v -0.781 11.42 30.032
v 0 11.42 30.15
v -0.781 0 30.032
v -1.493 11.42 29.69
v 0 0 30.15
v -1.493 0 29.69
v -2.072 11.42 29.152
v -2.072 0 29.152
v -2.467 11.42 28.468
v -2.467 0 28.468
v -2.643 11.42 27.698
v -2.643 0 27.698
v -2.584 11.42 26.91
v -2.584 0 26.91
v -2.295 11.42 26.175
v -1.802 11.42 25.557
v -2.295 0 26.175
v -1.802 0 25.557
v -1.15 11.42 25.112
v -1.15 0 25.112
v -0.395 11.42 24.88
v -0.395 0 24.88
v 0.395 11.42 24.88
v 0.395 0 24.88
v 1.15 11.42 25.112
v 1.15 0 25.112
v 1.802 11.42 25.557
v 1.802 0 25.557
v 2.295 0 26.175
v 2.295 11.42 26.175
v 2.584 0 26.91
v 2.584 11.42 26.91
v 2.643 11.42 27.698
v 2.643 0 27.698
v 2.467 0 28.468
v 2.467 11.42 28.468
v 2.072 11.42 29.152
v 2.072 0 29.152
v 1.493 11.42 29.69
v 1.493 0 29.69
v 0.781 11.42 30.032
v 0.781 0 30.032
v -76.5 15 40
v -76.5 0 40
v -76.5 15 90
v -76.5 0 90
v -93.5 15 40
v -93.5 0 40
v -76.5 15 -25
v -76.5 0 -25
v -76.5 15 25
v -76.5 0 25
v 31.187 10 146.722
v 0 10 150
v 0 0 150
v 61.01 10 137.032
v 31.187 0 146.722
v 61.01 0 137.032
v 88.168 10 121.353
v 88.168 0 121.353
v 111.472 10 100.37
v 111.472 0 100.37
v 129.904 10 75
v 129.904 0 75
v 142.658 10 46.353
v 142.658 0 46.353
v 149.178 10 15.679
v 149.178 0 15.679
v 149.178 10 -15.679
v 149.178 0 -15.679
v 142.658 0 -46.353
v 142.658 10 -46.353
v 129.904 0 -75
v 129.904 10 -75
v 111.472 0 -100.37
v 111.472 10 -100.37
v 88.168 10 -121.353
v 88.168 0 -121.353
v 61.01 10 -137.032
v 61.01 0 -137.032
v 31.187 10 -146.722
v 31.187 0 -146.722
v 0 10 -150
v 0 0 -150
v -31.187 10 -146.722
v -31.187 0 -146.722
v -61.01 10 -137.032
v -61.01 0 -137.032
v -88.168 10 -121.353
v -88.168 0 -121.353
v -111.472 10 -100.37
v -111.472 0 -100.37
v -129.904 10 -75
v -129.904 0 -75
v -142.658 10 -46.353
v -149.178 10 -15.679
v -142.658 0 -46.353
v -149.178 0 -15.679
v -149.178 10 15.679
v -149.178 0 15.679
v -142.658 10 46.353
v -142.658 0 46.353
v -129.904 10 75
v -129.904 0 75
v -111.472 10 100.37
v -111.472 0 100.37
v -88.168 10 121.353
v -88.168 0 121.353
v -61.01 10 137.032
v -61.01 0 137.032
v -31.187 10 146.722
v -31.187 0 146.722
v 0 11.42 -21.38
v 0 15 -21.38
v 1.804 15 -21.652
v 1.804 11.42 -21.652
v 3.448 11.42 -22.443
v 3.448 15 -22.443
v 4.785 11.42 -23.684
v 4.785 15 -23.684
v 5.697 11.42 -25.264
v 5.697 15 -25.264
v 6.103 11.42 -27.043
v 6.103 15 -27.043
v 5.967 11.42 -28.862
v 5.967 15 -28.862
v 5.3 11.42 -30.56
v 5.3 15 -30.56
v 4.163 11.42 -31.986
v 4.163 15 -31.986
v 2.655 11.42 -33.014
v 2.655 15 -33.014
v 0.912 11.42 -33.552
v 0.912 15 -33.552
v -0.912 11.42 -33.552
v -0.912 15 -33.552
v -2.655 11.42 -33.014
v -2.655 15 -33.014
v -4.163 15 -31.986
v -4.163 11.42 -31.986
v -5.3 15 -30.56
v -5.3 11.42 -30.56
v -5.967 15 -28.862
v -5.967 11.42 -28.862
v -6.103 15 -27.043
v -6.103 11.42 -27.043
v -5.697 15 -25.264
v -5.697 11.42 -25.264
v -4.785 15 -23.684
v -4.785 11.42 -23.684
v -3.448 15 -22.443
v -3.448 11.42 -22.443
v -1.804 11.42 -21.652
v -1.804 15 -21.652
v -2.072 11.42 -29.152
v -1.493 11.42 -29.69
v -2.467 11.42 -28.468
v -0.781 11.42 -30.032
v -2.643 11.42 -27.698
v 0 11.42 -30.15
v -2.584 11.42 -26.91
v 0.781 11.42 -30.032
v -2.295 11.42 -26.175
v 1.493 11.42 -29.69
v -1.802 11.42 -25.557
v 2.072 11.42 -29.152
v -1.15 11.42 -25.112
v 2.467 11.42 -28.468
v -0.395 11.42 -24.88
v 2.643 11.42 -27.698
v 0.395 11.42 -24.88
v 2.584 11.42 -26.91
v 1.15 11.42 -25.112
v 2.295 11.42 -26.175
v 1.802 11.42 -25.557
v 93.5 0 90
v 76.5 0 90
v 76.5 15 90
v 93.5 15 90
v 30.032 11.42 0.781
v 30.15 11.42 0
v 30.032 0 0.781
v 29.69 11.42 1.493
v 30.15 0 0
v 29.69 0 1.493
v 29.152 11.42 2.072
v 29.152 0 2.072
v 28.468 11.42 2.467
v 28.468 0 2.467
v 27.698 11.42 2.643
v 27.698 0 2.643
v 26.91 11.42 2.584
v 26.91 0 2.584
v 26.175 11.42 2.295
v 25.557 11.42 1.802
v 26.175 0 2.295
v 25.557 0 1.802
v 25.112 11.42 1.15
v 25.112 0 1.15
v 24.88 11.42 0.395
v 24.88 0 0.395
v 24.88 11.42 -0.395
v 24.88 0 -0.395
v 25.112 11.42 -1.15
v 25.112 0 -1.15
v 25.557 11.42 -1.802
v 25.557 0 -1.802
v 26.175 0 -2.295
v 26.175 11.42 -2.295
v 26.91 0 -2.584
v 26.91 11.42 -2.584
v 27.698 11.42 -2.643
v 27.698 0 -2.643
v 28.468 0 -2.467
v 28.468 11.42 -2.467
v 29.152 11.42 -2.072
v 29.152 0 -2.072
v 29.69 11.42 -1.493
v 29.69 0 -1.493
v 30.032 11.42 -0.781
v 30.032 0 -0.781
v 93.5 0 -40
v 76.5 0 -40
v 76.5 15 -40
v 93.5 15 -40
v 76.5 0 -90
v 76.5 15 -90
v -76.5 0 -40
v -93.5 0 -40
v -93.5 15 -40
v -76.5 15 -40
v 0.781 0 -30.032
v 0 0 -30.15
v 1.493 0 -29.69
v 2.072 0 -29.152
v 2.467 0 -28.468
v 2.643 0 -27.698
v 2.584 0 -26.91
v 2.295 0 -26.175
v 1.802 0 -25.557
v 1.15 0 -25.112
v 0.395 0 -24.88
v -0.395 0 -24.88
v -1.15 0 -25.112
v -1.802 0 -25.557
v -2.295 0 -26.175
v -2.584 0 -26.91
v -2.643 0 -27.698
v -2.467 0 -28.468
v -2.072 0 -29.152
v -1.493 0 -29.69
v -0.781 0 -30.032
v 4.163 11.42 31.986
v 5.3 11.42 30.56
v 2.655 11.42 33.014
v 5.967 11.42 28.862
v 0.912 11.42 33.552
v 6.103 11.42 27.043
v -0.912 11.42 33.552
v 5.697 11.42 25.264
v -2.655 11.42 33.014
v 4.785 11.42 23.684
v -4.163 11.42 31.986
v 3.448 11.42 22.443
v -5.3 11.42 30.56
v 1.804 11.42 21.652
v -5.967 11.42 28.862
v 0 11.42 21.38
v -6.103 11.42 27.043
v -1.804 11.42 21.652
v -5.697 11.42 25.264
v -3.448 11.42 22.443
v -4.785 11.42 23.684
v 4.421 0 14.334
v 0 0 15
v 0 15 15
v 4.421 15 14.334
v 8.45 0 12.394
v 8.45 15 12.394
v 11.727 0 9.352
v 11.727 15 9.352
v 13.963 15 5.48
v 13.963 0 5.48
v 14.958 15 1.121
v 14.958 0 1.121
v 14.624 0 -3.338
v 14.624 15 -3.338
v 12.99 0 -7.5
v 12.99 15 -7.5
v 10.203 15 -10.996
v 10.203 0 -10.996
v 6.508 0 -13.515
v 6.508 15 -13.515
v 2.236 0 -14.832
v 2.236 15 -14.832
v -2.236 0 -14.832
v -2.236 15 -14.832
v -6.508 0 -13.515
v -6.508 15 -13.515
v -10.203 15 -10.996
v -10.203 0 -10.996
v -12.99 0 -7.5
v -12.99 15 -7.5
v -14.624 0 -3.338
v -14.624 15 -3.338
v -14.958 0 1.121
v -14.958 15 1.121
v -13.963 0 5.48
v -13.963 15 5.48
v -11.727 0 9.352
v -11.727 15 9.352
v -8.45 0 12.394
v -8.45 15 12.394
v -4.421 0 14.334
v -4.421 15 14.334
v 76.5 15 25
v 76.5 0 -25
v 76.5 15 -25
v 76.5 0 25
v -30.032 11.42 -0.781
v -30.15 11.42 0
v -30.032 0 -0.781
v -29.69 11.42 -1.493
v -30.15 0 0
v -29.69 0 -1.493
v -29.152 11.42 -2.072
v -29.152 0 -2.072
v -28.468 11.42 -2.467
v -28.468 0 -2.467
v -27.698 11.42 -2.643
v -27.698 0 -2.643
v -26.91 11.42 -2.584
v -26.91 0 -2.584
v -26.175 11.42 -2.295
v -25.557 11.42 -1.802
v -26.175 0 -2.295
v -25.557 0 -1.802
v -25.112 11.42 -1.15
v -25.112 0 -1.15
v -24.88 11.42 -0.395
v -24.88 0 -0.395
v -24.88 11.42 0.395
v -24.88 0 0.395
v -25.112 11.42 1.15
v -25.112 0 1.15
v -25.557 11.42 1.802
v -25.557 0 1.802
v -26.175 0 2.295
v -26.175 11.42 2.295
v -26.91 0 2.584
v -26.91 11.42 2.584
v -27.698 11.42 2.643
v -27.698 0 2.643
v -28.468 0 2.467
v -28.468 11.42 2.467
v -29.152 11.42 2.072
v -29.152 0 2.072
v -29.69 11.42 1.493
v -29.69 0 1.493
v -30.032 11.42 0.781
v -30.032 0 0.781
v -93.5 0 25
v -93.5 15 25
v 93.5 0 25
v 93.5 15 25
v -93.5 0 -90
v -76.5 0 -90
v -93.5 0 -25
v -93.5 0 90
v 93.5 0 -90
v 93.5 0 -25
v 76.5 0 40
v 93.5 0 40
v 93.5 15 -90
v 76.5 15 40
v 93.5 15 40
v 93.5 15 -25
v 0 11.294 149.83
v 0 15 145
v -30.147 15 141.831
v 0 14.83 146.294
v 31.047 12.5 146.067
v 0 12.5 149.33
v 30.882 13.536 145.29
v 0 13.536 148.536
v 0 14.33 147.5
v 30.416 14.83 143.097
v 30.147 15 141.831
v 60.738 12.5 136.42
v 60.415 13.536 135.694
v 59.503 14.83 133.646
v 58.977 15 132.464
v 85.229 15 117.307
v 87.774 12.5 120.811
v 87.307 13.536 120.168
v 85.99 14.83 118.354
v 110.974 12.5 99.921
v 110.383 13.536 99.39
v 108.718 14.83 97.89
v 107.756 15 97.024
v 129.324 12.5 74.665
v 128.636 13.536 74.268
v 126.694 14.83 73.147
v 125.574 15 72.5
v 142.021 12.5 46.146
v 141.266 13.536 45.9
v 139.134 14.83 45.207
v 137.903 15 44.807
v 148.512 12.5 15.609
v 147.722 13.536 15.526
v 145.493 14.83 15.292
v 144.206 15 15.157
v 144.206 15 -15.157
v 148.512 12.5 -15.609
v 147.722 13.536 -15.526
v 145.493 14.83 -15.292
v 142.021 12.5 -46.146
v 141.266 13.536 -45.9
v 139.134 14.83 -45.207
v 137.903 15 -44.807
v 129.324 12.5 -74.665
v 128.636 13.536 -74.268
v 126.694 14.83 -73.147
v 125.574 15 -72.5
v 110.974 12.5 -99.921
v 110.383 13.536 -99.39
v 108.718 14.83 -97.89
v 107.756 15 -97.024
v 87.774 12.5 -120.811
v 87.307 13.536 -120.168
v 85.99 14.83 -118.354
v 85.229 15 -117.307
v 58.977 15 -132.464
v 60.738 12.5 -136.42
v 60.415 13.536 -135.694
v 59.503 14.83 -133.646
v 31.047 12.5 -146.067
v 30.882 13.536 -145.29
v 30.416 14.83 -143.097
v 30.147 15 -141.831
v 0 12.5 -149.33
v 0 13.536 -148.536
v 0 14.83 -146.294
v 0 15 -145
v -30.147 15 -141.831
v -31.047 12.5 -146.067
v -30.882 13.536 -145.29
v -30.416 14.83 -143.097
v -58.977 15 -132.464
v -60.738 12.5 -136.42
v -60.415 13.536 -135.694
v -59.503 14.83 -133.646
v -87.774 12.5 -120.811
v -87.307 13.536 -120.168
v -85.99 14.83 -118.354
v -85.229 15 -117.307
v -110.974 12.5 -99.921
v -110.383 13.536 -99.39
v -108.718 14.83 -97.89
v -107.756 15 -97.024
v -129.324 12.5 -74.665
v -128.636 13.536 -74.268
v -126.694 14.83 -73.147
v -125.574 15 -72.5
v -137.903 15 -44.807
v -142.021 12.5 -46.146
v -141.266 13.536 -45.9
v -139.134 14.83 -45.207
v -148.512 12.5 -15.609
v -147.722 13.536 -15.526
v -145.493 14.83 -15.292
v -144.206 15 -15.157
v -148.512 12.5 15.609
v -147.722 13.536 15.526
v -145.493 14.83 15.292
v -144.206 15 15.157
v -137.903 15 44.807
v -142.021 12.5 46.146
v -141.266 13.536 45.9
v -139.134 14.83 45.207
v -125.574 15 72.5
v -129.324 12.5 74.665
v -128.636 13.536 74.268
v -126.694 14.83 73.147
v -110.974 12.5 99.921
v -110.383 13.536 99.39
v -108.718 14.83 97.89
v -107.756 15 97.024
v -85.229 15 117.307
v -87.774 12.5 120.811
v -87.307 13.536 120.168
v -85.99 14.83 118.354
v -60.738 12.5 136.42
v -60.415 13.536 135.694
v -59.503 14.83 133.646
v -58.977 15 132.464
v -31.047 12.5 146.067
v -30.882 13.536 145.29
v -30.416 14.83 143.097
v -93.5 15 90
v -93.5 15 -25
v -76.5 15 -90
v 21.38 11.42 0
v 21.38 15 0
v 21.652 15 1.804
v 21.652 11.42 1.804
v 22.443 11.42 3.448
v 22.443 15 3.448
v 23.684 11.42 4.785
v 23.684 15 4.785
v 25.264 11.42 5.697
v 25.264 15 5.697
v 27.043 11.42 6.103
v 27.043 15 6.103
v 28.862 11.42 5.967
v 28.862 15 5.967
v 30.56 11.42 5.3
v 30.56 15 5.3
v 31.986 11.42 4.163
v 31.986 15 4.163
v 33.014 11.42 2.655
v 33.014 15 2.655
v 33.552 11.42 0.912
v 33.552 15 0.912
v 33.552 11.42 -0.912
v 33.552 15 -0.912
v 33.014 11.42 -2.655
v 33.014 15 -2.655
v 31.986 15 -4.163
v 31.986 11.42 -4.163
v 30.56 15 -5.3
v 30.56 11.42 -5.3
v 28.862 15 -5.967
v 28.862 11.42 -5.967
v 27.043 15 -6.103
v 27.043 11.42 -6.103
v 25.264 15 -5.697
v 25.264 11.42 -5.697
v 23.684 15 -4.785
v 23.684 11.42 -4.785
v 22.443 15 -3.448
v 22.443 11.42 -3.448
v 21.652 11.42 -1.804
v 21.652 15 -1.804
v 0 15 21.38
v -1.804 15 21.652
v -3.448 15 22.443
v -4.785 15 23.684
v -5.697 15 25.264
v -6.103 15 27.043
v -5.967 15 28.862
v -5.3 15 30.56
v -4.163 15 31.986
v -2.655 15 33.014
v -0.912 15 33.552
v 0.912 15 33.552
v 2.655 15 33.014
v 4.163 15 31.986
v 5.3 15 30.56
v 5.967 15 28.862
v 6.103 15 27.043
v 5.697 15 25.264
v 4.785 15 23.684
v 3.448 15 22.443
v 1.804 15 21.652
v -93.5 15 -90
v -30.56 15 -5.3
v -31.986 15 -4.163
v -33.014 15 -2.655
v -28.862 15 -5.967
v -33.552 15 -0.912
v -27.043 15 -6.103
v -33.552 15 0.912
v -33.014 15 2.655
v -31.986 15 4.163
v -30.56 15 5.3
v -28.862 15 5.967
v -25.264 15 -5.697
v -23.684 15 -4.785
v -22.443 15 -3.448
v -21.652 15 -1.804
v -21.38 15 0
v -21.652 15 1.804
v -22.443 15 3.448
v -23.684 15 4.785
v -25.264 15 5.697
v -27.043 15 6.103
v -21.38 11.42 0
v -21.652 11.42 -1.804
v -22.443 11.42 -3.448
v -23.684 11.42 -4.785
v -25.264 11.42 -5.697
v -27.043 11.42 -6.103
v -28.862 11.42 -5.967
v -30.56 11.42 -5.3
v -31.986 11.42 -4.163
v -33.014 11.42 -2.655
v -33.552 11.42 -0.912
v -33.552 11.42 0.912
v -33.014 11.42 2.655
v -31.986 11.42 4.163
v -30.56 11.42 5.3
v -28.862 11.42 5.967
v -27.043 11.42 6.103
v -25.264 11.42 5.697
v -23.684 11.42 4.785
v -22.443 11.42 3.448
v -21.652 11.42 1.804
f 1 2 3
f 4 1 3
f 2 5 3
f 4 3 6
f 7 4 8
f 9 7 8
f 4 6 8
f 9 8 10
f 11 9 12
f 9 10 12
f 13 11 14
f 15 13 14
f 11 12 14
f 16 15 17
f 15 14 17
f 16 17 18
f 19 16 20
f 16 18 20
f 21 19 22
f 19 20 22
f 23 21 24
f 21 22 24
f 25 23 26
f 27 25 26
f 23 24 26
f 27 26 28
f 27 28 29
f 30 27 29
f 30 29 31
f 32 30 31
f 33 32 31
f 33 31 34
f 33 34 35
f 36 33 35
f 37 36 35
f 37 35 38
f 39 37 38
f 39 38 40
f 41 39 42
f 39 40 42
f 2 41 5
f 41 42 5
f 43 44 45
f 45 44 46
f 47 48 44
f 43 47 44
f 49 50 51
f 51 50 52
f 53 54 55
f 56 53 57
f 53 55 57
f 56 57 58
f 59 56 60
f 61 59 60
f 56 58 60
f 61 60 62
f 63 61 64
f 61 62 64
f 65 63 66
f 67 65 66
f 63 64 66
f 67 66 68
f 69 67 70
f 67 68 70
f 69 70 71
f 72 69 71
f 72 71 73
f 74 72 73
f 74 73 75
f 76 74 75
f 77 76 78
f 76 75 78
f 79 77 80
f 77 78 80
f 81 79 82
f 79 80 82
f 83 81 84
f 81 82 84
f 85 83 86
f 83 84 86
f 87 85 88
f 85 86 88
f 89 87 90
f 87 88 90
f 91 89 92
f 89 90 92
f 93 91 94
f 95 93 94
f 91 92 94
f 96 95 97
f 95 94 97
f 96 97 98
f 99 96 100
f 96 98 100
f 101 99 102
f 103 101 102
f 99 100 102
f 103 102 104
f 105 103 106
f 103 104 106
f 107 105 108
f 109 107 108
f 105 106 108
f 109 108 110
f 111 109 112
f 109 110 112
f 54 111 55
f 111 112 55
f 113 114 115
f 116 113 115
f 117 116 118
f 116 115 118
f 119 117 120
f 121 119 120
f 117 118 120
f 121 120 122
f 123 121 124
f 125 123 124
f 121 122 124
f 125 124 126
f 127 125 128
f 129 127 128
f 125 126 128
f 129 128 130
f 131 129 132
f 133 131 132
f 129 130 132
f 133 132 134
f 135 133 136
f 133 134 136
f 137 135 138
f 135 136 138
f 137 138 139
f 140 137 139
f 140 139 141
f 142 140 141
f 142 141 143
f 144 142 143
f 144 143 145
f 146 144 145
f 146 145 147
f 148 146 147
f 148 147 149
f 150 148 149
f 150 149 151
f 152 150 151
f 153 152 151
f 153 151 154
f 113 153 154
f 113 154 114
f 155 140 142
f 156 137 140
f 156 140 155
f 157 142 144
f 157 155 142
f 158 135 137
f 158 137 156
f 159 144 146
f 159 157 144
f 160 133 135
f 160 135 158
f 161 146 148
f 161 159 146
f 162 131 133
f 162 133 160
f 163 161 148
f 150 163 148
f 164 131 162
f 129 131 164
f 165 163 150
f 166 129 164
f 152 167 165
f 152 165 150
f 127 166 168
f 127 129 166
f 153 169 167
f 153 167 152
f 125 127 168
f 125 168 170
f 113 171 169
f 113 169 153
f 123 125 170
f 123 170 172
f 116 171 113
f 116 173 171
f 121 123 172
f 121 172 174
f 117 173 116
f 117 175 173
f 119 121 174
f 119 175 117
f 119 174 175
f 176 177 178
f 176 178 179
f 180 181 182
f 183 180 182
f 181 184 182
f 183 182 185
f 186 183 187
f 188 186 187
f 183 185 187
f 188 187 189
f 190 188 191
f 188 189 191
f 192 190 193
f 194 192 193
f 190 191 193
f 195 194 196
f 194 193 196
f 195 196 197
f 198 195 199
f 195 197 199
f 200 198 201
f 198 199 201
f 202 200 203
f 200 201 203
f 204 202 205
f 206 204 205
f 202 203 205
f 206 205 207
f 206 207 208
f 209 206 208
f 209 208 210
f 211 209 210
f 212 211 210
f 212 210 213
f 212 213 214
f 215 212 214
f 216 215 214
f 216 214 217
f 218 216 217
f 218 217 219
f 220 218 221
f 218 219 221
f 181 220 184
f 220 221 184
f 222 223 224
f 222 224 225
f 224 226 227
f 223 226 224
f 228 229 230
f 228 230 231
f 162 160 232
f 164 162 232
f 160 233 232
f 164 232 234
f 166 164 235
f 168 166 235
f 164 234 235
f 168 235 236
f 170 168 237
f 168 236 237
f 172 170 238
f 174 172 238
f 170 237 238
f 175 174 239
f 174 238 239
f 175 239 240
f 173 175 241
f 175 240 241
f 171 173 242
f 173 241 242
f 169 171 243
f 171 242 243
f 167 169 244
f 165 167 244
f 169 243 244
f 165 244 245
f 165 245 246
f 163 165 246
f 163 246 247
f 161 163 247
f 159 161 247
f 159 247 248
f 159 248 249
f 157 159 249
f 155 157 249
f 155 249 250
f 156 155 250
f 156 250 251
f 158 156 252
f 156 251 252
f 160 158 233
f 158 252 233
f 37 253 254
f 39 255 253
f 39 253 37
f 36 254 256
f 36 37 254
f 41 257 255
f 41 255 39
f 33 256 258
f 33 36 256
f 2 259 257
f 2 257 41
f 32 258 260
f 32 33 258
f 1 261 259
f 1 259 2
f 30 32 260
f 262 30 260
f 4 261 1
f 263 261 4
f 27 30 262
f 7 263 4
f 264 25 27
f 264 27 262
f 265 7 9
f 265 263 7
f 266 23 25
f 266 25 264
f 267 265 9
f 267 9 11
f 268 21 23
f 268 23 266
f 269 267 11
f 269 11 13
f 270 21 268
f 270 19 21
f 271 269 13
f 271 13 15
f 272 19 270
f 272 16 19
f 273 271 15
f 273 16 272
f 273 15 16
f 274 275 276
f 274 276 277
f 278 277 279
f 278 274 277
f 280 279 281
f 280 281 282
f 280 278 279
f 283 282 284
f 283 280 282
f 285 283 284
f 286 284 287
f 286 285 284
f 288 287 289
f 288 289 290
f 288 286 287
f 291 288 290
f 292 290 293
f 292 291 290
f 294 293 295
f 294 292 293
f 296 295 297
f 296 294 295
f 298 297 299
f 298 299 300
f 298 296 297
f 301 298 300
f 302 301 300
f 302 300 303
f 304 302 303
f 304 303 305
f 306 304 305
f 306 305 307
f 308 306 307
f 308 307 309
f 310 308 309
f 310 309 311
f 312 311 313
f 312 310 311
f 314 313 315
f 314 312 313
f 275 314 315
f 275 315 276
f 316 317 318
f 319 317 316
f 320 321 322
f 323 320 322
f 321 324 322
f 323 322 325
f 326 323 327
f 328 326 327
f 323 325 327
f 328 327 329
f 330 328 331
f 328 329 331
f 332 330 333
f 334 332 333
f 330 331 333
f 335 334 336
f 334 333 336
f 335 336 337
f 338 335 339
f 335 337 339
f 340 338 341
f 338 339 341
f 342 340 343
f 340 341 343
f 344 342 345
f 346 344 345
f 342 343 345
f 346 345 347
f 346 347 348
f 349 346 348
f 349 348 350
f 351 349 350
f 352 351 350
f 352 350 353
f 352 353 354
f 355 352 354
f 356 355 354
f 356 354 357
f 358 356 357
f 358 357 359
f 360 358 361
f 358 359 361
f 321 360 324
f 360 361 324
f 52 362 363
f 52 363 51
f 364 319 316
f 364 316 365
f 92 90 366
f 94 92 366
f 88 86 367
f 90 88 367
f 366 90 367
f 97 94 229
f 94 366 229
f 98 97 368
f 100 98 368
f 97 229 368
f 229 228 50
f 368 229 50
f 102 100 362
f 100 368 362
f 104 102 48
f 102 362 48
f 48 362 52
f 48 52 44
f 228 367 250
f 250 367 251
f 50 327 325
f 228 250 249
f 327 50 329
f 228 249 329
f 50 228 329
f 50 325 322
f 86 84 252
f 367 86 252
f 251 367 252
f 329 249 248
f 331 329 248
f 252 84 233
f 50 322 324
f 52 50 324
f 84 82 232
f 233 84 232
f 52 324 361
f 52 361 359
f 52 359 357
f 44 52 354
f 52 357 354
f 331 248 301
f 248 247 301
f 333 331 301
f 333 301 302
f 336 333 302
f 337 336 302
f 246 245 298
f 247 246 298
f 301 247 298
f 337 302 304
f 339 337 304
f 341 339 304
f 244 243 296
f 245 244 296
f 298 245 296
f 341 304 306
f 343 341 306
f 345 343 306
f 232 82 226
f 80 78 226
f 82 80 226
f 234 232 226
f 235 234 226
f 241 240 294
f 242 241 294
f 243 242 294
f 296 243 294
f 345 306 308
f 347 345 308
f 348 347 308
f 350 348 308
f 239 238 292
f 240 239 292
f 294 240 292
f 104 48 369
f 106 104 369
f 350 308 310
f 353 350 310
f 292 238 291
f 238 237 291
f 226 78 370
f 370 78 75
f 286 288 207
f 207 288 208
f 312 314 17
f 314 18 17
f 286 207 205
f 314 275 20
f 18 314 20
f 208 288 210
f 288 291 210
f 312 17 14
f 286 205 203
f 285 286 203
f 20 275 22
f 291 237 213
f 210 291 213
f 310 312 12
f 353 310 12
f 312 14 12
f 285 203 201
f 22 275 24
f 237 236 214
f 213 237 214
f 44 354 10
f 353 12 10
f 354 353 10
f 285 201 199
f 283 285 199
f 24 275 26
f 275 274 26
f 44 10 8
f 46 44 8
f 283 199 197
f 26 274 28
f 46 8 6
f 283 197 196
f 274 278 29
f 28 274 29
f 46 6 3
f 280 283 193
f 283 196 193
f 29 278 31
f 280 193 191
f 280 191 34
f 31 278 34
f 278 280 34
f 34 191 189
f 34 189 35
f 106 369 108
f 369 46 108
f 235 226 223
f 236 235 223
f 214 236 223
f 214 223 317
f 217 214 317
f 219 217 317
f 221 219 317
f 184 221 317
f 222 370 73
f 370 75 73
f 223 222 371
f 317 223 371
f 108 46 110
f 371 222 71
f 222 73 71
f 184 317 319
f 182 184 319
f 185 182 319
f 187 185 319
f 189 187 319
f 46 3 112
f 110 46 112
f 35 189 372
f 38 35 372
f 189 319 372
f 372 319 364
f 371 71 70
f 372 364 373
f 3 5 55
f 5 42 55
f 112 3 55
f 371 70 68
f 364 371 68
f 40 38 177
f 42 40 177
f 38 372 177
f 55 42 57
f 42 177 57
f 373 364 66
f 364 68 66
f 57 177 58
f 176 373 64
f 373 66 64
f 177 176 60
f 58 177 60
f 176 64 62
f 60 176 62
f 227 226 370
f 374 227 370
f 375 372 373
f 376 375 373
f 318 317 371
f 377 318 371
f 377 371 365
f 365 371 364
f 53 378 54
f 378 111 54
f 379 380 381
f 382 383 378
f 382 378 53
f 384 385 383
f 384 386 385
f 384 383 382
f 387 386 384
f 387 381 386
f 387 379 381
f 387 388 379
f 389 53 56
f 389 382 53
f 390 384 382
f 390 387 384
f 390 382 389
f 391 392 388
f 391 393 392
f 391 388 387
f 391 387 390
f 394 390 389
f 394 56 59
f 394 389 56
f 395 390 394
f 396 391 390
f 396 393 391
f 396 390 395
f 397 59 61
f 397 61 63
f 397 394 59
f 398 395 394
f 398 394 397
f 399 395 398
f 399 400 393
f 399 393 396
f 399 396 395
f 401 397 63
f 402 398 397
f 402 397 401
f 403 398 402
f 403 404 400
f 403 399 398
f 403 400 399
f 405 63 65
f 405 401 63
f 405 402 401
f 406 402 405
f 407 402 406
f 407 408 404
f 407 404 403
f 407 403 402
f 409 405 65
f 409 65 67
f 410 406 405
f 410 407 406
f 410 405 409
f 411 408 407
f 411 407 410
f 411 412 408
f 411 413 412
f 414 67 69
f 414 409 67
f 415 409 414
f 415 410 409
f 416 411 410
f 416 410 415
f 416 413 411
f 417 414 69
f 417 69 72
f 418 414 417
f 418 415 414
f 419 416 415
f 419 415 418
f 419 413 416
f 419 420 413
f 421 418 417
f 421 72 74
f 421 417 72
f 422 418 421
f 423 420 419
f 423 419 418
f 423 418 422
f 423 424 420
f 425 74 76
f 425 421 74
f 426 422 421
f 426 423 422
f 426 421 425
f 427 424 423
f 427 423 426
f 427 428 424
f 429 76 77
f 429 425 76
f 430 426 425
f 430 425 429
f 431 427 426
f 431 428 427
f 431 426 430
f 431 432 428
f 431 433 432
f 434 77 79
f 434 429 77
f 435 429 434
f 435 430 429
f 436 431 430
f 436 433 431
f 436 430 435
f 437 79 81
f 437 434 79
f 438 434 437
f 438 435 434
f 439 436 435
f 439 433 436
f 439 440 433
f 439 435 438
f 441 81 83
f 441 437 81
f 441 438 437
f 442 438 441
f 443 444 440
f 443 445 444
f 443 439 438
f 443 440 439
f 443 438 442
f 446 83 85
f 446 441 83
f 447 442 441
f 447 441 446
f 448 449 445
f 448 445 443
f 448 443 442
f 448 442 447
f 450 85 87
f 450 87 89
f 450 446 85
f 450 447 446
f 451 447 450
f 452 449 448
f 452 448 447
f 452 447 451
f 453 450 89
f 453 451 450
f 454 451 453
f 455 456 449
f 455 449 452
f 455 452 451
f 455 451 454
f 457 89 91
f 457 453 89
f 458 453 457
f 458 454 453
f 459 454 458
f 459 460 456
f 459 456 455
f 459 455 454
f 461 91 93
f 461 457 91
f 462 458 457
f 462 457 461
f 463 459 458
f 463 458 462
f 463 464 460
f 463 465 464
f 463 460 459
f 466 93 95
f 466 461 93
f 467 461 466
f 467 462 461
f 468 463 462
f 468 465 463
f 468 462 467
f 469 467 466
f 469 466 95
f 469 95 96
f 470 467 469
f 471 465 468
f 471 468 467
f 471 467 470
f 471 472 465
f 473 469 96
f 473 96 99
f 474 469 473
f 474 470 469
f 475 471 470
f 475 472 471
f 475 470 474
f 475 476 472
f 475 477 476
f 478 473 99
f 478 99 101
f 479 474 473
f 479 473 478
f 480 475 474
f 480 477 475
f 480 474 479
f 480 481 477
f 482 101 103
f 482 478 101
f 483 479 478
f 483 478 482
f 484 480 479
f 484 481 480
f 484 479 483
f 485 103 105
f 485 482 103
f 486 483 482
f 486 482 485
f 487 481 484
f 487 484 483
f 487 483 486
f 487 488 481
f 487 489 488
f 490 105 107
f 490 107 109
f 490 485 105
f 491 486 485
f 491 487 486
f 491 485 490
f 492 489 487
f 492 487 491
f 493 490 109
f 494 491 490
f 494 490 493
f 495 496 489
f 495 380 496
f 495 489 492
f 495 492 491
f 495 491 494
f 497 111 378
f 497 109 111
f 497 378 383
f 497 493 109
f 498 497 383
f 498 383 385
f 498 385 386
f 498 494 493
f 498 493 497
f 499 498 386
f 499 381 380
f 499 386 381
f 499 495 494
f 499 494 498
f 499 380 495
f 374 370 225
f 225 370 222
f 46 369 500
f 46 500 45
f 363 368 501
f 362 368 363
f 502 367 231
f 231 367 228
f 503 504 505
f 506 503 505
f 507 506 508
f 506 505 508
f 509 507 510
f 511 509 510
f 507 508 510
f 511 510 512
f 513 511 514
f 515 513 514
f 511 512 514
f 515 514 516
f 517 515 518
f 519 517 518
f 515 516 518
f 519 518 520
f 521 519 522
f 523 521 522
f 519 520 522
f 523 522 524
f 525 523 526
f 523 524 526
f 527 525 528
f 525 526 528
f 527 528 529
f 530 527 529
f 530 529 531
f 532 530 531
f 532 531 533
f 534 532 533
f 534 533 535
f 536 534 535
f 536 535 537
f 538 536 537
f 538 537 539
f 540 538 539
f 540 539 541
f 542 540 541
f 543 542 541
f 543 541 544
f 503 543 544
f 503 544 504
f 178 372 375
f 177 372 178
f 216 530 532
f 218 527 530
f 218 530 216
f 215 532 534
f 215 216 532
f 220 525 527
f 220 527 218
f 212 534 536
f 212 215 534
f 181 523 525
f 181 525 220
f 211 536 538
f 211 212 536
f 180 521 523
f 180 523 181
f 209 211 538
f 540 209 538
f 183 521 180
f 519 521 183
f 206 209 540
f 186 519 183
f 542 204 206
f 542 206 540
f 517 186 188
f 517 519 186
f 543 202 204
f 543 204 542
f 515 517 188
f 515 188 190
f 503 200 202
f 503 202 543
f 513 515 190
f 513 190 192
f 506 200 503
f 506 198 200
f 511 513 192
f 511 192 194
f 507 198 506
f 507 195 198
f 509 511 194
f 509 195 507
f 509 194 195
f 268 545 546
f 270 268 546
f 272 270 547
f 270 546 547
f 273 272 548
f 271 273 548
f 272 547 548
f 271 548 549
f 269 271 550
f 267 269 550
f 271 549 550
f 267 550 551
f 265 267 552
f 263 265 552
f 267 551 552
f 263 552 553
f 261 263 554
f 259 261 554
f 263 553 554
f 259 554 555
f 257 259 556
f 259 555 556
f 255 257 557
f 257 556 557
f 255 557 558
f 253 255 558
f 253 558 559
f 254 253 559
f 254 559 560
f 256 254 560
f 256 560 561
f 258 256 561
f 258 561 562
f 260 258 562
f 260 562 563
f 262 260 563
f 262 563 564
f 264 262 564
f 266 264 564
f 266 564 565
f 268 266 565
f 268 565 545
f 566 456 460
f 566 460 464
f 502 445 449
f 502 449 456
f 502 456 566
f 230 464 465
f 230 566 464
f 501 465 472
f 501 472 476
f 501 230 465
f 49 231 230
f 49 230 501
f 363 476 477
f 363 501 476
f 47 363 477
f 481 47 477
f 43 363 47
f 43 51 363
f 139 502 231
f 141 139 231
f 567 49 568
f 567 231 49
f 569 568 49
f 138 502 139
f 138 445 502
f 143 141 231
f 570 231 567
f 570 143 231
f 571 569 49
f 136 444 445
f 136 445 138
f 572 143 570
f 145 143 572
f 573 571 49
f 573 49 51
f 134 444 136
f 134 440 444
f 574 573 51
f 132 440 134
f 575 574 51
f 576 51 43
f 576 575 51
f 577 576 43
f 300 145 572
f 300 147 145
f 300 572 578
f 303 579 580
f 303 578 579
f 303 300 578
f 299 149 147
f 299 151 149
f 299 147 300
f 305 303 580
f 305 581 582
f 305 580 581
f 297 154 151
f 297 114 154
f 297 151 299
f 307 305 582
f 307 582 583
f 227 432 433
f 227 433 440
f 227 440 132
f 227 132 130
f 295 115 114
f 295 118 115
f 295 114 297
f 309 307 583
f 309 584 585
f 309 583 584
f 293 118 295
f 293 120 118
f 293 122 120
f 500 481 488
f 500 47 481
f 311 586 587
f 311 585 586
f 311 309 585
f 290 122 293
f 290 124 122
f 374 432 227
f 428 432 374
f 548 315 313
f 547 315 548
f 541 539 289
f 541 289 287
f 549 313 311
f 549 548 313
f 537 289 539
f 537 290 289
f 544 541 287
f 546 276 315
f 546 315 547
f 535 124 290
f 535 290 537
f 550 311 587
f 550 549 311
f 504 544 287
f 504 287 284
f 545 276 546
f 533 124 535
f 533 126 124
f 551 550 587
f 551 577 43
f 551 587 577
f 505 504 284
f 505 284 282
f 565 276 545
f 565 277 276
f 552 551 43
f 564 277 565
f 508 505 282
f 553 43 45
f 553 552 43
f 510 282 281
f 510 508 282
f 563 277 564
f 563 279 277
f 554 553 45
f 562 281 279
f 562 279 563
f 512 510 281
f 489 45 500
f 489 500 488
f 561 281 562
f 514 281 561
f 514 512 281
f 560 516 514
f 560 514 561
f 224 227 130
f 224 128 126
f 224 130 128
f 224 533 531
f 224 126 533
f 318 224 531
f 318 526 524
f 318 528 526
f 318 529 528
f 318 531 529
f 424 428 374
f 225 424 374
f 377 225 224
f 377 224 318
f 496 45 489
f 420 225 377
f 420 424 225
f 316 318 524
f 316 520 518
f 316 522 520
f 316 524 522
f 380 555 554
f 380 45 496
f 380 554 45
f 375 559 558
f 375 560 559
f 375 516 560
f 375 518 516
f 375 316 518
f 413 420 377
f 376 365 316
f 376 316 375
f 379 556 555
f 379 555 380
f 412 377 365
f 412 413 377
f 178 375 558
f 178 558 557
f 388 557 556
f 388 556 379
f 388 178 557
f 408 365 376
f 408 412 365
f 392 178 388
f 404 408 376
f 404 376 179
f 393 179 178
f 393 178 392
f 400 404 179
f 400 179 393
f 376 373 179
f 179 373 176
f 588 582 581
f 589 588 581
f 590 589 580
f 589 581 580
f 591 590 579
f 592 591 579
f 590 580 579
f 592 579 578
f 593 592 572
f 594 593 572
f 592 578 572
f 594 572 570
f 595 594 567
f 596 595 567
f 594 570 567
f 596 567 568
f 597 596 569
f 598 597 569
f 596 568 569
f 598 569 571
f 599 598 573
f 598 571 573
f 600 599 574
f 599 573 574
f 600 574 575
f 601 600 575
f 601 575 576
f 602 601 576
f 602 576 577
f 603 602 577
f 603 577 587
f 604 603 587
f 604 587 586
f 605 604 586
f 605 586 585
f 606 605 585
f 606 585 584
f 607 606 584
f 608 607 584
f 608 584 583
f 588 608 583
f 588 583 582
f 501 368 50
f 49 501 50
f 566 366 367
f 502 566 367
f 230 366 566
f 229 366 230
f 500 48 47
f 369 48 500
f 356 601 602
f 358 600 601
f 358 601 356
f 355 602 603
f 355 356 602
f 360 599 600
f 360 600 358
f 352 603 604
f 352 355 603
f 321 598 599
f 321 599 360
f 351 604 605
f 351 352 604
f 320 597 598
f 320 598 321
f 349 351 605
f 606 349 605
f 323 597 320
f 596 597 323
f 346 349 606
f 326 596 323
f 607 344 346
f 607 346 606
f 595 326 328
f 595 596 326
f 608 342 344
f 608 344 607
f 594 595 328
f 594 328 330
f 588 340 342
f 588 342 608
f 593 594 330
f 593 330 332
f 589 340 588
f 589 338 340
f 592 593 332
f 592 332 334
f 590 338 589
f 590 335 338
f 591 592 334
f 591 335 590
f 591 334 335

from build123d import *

# Parameters (mm, degrees)
SKETCH1_R                               = 150
SKETCH1_R_2                             = 15
BOSS_EXTRUDE1_DEPTH                     = 15
CBORE_FOR_M5_HEX_HEAD_BOLT1_D           = 5.3
CBORE_FOR_M5_HEX_HEAD_BOLT1_CBORE_D     = 12.24
CBORE_FOR_M5_HEX_HEAD_BOLT1_CBORE_DEPTH = 3.58
CIRPATTERN1_COUNT                       = 4
SKETCH5_W                               = 17
SKETCH5_H                               = 50
CUT_EXTRUDE1_DEPTH                      = 213.661703181
FILLET1_R                               = 5


with BuildPart() as part:
    # Sketch1 → Boss-Extrude1 (new body)
    with BuildSketch(Plane(origin=(0, 0, 0), x_dir=(1, 0, 0), z_dir=(0, 1, 0))):
        with Locations(Location((0, 0, 0), (0, 0, 270))):
            Circle(SKETCH1_R)
        with Locations(Location((0, 0, 0), (0, 0, 270))):
            Circle(SKETCH1_R_2, mode=Mode.SUBTRACT)
    extrude(amount=BOSS_EXTRUDE1_DEPTH)

    # CBORE for M5 Hex Head Bolt1 (through all)
    with Locations(Plane(origin=(0, 15, -27.5), x_dir=(0, 0, 1), z_dir=(0, 1, 0))):
        with Locations((0, 0)):
            cbore_for_m5_hex_head_bolt1 = CounterBoreHole(CBORE_FOR_M5_HEX_HEAD_BOLT1_D / 2, CBORE_FOR_M5_HEX_HEAD_BOLT1_CBORE_D / 2, CBORE_FOR_M5_HEX_HEAD_BOLT1_CBORE_DEPTH)

    # CirPattern1: CBORE for M5 Hex Head Bolt1 ×4 about axis
    cirpattern1_axis = Axis((0, 0, 0), (0, 1, 0))
    for i in range(1, CIRPATTERN1_COUNT):
        add(cbore_for_m5_hex_head_bolt1.rotate(cirpattern1_axis, i * 360 / CIRPATTERN1_COUNT), mode=Mode.SUBTRACT)

    # Sketch5 → Cut-Extrude1 (cut, through all)
    with BuildSketch(Plane.XZ):
        with Locations((-85, 65)):
            Rectangle(SKETCH5_W, SKETCH5_H)
        with Locations((-85, 0)):
            Rectangle(SKETCH5_W, SKETCH5_H)
        with Locations((-85, -65)):
            Rectangle(SKETCH5_W, SKETCH5_H)
        with Locations((85, 65)):
            Rectangle(SKETCH5_W, SKETCH5_H)
        with Locations((85, 0)):
            Rectangle(SKETCH5_W, SKETCH5_H)
        with Locations((85, -65)):
            Rectangle(SKETCH5_W, SKETCH5_H)
    extrude(amount=-CUT_EXTRUDE1_DEPTH, mode=Mode.SUBTRACT)

    # Fillet1
    fillet1_edges = [part.edges().sort_by_distance(p)[0] for p in [
        (0, 15, -150),
    ]]
    fillet(fillet1_edges, radius=FILLET1_R)


solid = part.part
